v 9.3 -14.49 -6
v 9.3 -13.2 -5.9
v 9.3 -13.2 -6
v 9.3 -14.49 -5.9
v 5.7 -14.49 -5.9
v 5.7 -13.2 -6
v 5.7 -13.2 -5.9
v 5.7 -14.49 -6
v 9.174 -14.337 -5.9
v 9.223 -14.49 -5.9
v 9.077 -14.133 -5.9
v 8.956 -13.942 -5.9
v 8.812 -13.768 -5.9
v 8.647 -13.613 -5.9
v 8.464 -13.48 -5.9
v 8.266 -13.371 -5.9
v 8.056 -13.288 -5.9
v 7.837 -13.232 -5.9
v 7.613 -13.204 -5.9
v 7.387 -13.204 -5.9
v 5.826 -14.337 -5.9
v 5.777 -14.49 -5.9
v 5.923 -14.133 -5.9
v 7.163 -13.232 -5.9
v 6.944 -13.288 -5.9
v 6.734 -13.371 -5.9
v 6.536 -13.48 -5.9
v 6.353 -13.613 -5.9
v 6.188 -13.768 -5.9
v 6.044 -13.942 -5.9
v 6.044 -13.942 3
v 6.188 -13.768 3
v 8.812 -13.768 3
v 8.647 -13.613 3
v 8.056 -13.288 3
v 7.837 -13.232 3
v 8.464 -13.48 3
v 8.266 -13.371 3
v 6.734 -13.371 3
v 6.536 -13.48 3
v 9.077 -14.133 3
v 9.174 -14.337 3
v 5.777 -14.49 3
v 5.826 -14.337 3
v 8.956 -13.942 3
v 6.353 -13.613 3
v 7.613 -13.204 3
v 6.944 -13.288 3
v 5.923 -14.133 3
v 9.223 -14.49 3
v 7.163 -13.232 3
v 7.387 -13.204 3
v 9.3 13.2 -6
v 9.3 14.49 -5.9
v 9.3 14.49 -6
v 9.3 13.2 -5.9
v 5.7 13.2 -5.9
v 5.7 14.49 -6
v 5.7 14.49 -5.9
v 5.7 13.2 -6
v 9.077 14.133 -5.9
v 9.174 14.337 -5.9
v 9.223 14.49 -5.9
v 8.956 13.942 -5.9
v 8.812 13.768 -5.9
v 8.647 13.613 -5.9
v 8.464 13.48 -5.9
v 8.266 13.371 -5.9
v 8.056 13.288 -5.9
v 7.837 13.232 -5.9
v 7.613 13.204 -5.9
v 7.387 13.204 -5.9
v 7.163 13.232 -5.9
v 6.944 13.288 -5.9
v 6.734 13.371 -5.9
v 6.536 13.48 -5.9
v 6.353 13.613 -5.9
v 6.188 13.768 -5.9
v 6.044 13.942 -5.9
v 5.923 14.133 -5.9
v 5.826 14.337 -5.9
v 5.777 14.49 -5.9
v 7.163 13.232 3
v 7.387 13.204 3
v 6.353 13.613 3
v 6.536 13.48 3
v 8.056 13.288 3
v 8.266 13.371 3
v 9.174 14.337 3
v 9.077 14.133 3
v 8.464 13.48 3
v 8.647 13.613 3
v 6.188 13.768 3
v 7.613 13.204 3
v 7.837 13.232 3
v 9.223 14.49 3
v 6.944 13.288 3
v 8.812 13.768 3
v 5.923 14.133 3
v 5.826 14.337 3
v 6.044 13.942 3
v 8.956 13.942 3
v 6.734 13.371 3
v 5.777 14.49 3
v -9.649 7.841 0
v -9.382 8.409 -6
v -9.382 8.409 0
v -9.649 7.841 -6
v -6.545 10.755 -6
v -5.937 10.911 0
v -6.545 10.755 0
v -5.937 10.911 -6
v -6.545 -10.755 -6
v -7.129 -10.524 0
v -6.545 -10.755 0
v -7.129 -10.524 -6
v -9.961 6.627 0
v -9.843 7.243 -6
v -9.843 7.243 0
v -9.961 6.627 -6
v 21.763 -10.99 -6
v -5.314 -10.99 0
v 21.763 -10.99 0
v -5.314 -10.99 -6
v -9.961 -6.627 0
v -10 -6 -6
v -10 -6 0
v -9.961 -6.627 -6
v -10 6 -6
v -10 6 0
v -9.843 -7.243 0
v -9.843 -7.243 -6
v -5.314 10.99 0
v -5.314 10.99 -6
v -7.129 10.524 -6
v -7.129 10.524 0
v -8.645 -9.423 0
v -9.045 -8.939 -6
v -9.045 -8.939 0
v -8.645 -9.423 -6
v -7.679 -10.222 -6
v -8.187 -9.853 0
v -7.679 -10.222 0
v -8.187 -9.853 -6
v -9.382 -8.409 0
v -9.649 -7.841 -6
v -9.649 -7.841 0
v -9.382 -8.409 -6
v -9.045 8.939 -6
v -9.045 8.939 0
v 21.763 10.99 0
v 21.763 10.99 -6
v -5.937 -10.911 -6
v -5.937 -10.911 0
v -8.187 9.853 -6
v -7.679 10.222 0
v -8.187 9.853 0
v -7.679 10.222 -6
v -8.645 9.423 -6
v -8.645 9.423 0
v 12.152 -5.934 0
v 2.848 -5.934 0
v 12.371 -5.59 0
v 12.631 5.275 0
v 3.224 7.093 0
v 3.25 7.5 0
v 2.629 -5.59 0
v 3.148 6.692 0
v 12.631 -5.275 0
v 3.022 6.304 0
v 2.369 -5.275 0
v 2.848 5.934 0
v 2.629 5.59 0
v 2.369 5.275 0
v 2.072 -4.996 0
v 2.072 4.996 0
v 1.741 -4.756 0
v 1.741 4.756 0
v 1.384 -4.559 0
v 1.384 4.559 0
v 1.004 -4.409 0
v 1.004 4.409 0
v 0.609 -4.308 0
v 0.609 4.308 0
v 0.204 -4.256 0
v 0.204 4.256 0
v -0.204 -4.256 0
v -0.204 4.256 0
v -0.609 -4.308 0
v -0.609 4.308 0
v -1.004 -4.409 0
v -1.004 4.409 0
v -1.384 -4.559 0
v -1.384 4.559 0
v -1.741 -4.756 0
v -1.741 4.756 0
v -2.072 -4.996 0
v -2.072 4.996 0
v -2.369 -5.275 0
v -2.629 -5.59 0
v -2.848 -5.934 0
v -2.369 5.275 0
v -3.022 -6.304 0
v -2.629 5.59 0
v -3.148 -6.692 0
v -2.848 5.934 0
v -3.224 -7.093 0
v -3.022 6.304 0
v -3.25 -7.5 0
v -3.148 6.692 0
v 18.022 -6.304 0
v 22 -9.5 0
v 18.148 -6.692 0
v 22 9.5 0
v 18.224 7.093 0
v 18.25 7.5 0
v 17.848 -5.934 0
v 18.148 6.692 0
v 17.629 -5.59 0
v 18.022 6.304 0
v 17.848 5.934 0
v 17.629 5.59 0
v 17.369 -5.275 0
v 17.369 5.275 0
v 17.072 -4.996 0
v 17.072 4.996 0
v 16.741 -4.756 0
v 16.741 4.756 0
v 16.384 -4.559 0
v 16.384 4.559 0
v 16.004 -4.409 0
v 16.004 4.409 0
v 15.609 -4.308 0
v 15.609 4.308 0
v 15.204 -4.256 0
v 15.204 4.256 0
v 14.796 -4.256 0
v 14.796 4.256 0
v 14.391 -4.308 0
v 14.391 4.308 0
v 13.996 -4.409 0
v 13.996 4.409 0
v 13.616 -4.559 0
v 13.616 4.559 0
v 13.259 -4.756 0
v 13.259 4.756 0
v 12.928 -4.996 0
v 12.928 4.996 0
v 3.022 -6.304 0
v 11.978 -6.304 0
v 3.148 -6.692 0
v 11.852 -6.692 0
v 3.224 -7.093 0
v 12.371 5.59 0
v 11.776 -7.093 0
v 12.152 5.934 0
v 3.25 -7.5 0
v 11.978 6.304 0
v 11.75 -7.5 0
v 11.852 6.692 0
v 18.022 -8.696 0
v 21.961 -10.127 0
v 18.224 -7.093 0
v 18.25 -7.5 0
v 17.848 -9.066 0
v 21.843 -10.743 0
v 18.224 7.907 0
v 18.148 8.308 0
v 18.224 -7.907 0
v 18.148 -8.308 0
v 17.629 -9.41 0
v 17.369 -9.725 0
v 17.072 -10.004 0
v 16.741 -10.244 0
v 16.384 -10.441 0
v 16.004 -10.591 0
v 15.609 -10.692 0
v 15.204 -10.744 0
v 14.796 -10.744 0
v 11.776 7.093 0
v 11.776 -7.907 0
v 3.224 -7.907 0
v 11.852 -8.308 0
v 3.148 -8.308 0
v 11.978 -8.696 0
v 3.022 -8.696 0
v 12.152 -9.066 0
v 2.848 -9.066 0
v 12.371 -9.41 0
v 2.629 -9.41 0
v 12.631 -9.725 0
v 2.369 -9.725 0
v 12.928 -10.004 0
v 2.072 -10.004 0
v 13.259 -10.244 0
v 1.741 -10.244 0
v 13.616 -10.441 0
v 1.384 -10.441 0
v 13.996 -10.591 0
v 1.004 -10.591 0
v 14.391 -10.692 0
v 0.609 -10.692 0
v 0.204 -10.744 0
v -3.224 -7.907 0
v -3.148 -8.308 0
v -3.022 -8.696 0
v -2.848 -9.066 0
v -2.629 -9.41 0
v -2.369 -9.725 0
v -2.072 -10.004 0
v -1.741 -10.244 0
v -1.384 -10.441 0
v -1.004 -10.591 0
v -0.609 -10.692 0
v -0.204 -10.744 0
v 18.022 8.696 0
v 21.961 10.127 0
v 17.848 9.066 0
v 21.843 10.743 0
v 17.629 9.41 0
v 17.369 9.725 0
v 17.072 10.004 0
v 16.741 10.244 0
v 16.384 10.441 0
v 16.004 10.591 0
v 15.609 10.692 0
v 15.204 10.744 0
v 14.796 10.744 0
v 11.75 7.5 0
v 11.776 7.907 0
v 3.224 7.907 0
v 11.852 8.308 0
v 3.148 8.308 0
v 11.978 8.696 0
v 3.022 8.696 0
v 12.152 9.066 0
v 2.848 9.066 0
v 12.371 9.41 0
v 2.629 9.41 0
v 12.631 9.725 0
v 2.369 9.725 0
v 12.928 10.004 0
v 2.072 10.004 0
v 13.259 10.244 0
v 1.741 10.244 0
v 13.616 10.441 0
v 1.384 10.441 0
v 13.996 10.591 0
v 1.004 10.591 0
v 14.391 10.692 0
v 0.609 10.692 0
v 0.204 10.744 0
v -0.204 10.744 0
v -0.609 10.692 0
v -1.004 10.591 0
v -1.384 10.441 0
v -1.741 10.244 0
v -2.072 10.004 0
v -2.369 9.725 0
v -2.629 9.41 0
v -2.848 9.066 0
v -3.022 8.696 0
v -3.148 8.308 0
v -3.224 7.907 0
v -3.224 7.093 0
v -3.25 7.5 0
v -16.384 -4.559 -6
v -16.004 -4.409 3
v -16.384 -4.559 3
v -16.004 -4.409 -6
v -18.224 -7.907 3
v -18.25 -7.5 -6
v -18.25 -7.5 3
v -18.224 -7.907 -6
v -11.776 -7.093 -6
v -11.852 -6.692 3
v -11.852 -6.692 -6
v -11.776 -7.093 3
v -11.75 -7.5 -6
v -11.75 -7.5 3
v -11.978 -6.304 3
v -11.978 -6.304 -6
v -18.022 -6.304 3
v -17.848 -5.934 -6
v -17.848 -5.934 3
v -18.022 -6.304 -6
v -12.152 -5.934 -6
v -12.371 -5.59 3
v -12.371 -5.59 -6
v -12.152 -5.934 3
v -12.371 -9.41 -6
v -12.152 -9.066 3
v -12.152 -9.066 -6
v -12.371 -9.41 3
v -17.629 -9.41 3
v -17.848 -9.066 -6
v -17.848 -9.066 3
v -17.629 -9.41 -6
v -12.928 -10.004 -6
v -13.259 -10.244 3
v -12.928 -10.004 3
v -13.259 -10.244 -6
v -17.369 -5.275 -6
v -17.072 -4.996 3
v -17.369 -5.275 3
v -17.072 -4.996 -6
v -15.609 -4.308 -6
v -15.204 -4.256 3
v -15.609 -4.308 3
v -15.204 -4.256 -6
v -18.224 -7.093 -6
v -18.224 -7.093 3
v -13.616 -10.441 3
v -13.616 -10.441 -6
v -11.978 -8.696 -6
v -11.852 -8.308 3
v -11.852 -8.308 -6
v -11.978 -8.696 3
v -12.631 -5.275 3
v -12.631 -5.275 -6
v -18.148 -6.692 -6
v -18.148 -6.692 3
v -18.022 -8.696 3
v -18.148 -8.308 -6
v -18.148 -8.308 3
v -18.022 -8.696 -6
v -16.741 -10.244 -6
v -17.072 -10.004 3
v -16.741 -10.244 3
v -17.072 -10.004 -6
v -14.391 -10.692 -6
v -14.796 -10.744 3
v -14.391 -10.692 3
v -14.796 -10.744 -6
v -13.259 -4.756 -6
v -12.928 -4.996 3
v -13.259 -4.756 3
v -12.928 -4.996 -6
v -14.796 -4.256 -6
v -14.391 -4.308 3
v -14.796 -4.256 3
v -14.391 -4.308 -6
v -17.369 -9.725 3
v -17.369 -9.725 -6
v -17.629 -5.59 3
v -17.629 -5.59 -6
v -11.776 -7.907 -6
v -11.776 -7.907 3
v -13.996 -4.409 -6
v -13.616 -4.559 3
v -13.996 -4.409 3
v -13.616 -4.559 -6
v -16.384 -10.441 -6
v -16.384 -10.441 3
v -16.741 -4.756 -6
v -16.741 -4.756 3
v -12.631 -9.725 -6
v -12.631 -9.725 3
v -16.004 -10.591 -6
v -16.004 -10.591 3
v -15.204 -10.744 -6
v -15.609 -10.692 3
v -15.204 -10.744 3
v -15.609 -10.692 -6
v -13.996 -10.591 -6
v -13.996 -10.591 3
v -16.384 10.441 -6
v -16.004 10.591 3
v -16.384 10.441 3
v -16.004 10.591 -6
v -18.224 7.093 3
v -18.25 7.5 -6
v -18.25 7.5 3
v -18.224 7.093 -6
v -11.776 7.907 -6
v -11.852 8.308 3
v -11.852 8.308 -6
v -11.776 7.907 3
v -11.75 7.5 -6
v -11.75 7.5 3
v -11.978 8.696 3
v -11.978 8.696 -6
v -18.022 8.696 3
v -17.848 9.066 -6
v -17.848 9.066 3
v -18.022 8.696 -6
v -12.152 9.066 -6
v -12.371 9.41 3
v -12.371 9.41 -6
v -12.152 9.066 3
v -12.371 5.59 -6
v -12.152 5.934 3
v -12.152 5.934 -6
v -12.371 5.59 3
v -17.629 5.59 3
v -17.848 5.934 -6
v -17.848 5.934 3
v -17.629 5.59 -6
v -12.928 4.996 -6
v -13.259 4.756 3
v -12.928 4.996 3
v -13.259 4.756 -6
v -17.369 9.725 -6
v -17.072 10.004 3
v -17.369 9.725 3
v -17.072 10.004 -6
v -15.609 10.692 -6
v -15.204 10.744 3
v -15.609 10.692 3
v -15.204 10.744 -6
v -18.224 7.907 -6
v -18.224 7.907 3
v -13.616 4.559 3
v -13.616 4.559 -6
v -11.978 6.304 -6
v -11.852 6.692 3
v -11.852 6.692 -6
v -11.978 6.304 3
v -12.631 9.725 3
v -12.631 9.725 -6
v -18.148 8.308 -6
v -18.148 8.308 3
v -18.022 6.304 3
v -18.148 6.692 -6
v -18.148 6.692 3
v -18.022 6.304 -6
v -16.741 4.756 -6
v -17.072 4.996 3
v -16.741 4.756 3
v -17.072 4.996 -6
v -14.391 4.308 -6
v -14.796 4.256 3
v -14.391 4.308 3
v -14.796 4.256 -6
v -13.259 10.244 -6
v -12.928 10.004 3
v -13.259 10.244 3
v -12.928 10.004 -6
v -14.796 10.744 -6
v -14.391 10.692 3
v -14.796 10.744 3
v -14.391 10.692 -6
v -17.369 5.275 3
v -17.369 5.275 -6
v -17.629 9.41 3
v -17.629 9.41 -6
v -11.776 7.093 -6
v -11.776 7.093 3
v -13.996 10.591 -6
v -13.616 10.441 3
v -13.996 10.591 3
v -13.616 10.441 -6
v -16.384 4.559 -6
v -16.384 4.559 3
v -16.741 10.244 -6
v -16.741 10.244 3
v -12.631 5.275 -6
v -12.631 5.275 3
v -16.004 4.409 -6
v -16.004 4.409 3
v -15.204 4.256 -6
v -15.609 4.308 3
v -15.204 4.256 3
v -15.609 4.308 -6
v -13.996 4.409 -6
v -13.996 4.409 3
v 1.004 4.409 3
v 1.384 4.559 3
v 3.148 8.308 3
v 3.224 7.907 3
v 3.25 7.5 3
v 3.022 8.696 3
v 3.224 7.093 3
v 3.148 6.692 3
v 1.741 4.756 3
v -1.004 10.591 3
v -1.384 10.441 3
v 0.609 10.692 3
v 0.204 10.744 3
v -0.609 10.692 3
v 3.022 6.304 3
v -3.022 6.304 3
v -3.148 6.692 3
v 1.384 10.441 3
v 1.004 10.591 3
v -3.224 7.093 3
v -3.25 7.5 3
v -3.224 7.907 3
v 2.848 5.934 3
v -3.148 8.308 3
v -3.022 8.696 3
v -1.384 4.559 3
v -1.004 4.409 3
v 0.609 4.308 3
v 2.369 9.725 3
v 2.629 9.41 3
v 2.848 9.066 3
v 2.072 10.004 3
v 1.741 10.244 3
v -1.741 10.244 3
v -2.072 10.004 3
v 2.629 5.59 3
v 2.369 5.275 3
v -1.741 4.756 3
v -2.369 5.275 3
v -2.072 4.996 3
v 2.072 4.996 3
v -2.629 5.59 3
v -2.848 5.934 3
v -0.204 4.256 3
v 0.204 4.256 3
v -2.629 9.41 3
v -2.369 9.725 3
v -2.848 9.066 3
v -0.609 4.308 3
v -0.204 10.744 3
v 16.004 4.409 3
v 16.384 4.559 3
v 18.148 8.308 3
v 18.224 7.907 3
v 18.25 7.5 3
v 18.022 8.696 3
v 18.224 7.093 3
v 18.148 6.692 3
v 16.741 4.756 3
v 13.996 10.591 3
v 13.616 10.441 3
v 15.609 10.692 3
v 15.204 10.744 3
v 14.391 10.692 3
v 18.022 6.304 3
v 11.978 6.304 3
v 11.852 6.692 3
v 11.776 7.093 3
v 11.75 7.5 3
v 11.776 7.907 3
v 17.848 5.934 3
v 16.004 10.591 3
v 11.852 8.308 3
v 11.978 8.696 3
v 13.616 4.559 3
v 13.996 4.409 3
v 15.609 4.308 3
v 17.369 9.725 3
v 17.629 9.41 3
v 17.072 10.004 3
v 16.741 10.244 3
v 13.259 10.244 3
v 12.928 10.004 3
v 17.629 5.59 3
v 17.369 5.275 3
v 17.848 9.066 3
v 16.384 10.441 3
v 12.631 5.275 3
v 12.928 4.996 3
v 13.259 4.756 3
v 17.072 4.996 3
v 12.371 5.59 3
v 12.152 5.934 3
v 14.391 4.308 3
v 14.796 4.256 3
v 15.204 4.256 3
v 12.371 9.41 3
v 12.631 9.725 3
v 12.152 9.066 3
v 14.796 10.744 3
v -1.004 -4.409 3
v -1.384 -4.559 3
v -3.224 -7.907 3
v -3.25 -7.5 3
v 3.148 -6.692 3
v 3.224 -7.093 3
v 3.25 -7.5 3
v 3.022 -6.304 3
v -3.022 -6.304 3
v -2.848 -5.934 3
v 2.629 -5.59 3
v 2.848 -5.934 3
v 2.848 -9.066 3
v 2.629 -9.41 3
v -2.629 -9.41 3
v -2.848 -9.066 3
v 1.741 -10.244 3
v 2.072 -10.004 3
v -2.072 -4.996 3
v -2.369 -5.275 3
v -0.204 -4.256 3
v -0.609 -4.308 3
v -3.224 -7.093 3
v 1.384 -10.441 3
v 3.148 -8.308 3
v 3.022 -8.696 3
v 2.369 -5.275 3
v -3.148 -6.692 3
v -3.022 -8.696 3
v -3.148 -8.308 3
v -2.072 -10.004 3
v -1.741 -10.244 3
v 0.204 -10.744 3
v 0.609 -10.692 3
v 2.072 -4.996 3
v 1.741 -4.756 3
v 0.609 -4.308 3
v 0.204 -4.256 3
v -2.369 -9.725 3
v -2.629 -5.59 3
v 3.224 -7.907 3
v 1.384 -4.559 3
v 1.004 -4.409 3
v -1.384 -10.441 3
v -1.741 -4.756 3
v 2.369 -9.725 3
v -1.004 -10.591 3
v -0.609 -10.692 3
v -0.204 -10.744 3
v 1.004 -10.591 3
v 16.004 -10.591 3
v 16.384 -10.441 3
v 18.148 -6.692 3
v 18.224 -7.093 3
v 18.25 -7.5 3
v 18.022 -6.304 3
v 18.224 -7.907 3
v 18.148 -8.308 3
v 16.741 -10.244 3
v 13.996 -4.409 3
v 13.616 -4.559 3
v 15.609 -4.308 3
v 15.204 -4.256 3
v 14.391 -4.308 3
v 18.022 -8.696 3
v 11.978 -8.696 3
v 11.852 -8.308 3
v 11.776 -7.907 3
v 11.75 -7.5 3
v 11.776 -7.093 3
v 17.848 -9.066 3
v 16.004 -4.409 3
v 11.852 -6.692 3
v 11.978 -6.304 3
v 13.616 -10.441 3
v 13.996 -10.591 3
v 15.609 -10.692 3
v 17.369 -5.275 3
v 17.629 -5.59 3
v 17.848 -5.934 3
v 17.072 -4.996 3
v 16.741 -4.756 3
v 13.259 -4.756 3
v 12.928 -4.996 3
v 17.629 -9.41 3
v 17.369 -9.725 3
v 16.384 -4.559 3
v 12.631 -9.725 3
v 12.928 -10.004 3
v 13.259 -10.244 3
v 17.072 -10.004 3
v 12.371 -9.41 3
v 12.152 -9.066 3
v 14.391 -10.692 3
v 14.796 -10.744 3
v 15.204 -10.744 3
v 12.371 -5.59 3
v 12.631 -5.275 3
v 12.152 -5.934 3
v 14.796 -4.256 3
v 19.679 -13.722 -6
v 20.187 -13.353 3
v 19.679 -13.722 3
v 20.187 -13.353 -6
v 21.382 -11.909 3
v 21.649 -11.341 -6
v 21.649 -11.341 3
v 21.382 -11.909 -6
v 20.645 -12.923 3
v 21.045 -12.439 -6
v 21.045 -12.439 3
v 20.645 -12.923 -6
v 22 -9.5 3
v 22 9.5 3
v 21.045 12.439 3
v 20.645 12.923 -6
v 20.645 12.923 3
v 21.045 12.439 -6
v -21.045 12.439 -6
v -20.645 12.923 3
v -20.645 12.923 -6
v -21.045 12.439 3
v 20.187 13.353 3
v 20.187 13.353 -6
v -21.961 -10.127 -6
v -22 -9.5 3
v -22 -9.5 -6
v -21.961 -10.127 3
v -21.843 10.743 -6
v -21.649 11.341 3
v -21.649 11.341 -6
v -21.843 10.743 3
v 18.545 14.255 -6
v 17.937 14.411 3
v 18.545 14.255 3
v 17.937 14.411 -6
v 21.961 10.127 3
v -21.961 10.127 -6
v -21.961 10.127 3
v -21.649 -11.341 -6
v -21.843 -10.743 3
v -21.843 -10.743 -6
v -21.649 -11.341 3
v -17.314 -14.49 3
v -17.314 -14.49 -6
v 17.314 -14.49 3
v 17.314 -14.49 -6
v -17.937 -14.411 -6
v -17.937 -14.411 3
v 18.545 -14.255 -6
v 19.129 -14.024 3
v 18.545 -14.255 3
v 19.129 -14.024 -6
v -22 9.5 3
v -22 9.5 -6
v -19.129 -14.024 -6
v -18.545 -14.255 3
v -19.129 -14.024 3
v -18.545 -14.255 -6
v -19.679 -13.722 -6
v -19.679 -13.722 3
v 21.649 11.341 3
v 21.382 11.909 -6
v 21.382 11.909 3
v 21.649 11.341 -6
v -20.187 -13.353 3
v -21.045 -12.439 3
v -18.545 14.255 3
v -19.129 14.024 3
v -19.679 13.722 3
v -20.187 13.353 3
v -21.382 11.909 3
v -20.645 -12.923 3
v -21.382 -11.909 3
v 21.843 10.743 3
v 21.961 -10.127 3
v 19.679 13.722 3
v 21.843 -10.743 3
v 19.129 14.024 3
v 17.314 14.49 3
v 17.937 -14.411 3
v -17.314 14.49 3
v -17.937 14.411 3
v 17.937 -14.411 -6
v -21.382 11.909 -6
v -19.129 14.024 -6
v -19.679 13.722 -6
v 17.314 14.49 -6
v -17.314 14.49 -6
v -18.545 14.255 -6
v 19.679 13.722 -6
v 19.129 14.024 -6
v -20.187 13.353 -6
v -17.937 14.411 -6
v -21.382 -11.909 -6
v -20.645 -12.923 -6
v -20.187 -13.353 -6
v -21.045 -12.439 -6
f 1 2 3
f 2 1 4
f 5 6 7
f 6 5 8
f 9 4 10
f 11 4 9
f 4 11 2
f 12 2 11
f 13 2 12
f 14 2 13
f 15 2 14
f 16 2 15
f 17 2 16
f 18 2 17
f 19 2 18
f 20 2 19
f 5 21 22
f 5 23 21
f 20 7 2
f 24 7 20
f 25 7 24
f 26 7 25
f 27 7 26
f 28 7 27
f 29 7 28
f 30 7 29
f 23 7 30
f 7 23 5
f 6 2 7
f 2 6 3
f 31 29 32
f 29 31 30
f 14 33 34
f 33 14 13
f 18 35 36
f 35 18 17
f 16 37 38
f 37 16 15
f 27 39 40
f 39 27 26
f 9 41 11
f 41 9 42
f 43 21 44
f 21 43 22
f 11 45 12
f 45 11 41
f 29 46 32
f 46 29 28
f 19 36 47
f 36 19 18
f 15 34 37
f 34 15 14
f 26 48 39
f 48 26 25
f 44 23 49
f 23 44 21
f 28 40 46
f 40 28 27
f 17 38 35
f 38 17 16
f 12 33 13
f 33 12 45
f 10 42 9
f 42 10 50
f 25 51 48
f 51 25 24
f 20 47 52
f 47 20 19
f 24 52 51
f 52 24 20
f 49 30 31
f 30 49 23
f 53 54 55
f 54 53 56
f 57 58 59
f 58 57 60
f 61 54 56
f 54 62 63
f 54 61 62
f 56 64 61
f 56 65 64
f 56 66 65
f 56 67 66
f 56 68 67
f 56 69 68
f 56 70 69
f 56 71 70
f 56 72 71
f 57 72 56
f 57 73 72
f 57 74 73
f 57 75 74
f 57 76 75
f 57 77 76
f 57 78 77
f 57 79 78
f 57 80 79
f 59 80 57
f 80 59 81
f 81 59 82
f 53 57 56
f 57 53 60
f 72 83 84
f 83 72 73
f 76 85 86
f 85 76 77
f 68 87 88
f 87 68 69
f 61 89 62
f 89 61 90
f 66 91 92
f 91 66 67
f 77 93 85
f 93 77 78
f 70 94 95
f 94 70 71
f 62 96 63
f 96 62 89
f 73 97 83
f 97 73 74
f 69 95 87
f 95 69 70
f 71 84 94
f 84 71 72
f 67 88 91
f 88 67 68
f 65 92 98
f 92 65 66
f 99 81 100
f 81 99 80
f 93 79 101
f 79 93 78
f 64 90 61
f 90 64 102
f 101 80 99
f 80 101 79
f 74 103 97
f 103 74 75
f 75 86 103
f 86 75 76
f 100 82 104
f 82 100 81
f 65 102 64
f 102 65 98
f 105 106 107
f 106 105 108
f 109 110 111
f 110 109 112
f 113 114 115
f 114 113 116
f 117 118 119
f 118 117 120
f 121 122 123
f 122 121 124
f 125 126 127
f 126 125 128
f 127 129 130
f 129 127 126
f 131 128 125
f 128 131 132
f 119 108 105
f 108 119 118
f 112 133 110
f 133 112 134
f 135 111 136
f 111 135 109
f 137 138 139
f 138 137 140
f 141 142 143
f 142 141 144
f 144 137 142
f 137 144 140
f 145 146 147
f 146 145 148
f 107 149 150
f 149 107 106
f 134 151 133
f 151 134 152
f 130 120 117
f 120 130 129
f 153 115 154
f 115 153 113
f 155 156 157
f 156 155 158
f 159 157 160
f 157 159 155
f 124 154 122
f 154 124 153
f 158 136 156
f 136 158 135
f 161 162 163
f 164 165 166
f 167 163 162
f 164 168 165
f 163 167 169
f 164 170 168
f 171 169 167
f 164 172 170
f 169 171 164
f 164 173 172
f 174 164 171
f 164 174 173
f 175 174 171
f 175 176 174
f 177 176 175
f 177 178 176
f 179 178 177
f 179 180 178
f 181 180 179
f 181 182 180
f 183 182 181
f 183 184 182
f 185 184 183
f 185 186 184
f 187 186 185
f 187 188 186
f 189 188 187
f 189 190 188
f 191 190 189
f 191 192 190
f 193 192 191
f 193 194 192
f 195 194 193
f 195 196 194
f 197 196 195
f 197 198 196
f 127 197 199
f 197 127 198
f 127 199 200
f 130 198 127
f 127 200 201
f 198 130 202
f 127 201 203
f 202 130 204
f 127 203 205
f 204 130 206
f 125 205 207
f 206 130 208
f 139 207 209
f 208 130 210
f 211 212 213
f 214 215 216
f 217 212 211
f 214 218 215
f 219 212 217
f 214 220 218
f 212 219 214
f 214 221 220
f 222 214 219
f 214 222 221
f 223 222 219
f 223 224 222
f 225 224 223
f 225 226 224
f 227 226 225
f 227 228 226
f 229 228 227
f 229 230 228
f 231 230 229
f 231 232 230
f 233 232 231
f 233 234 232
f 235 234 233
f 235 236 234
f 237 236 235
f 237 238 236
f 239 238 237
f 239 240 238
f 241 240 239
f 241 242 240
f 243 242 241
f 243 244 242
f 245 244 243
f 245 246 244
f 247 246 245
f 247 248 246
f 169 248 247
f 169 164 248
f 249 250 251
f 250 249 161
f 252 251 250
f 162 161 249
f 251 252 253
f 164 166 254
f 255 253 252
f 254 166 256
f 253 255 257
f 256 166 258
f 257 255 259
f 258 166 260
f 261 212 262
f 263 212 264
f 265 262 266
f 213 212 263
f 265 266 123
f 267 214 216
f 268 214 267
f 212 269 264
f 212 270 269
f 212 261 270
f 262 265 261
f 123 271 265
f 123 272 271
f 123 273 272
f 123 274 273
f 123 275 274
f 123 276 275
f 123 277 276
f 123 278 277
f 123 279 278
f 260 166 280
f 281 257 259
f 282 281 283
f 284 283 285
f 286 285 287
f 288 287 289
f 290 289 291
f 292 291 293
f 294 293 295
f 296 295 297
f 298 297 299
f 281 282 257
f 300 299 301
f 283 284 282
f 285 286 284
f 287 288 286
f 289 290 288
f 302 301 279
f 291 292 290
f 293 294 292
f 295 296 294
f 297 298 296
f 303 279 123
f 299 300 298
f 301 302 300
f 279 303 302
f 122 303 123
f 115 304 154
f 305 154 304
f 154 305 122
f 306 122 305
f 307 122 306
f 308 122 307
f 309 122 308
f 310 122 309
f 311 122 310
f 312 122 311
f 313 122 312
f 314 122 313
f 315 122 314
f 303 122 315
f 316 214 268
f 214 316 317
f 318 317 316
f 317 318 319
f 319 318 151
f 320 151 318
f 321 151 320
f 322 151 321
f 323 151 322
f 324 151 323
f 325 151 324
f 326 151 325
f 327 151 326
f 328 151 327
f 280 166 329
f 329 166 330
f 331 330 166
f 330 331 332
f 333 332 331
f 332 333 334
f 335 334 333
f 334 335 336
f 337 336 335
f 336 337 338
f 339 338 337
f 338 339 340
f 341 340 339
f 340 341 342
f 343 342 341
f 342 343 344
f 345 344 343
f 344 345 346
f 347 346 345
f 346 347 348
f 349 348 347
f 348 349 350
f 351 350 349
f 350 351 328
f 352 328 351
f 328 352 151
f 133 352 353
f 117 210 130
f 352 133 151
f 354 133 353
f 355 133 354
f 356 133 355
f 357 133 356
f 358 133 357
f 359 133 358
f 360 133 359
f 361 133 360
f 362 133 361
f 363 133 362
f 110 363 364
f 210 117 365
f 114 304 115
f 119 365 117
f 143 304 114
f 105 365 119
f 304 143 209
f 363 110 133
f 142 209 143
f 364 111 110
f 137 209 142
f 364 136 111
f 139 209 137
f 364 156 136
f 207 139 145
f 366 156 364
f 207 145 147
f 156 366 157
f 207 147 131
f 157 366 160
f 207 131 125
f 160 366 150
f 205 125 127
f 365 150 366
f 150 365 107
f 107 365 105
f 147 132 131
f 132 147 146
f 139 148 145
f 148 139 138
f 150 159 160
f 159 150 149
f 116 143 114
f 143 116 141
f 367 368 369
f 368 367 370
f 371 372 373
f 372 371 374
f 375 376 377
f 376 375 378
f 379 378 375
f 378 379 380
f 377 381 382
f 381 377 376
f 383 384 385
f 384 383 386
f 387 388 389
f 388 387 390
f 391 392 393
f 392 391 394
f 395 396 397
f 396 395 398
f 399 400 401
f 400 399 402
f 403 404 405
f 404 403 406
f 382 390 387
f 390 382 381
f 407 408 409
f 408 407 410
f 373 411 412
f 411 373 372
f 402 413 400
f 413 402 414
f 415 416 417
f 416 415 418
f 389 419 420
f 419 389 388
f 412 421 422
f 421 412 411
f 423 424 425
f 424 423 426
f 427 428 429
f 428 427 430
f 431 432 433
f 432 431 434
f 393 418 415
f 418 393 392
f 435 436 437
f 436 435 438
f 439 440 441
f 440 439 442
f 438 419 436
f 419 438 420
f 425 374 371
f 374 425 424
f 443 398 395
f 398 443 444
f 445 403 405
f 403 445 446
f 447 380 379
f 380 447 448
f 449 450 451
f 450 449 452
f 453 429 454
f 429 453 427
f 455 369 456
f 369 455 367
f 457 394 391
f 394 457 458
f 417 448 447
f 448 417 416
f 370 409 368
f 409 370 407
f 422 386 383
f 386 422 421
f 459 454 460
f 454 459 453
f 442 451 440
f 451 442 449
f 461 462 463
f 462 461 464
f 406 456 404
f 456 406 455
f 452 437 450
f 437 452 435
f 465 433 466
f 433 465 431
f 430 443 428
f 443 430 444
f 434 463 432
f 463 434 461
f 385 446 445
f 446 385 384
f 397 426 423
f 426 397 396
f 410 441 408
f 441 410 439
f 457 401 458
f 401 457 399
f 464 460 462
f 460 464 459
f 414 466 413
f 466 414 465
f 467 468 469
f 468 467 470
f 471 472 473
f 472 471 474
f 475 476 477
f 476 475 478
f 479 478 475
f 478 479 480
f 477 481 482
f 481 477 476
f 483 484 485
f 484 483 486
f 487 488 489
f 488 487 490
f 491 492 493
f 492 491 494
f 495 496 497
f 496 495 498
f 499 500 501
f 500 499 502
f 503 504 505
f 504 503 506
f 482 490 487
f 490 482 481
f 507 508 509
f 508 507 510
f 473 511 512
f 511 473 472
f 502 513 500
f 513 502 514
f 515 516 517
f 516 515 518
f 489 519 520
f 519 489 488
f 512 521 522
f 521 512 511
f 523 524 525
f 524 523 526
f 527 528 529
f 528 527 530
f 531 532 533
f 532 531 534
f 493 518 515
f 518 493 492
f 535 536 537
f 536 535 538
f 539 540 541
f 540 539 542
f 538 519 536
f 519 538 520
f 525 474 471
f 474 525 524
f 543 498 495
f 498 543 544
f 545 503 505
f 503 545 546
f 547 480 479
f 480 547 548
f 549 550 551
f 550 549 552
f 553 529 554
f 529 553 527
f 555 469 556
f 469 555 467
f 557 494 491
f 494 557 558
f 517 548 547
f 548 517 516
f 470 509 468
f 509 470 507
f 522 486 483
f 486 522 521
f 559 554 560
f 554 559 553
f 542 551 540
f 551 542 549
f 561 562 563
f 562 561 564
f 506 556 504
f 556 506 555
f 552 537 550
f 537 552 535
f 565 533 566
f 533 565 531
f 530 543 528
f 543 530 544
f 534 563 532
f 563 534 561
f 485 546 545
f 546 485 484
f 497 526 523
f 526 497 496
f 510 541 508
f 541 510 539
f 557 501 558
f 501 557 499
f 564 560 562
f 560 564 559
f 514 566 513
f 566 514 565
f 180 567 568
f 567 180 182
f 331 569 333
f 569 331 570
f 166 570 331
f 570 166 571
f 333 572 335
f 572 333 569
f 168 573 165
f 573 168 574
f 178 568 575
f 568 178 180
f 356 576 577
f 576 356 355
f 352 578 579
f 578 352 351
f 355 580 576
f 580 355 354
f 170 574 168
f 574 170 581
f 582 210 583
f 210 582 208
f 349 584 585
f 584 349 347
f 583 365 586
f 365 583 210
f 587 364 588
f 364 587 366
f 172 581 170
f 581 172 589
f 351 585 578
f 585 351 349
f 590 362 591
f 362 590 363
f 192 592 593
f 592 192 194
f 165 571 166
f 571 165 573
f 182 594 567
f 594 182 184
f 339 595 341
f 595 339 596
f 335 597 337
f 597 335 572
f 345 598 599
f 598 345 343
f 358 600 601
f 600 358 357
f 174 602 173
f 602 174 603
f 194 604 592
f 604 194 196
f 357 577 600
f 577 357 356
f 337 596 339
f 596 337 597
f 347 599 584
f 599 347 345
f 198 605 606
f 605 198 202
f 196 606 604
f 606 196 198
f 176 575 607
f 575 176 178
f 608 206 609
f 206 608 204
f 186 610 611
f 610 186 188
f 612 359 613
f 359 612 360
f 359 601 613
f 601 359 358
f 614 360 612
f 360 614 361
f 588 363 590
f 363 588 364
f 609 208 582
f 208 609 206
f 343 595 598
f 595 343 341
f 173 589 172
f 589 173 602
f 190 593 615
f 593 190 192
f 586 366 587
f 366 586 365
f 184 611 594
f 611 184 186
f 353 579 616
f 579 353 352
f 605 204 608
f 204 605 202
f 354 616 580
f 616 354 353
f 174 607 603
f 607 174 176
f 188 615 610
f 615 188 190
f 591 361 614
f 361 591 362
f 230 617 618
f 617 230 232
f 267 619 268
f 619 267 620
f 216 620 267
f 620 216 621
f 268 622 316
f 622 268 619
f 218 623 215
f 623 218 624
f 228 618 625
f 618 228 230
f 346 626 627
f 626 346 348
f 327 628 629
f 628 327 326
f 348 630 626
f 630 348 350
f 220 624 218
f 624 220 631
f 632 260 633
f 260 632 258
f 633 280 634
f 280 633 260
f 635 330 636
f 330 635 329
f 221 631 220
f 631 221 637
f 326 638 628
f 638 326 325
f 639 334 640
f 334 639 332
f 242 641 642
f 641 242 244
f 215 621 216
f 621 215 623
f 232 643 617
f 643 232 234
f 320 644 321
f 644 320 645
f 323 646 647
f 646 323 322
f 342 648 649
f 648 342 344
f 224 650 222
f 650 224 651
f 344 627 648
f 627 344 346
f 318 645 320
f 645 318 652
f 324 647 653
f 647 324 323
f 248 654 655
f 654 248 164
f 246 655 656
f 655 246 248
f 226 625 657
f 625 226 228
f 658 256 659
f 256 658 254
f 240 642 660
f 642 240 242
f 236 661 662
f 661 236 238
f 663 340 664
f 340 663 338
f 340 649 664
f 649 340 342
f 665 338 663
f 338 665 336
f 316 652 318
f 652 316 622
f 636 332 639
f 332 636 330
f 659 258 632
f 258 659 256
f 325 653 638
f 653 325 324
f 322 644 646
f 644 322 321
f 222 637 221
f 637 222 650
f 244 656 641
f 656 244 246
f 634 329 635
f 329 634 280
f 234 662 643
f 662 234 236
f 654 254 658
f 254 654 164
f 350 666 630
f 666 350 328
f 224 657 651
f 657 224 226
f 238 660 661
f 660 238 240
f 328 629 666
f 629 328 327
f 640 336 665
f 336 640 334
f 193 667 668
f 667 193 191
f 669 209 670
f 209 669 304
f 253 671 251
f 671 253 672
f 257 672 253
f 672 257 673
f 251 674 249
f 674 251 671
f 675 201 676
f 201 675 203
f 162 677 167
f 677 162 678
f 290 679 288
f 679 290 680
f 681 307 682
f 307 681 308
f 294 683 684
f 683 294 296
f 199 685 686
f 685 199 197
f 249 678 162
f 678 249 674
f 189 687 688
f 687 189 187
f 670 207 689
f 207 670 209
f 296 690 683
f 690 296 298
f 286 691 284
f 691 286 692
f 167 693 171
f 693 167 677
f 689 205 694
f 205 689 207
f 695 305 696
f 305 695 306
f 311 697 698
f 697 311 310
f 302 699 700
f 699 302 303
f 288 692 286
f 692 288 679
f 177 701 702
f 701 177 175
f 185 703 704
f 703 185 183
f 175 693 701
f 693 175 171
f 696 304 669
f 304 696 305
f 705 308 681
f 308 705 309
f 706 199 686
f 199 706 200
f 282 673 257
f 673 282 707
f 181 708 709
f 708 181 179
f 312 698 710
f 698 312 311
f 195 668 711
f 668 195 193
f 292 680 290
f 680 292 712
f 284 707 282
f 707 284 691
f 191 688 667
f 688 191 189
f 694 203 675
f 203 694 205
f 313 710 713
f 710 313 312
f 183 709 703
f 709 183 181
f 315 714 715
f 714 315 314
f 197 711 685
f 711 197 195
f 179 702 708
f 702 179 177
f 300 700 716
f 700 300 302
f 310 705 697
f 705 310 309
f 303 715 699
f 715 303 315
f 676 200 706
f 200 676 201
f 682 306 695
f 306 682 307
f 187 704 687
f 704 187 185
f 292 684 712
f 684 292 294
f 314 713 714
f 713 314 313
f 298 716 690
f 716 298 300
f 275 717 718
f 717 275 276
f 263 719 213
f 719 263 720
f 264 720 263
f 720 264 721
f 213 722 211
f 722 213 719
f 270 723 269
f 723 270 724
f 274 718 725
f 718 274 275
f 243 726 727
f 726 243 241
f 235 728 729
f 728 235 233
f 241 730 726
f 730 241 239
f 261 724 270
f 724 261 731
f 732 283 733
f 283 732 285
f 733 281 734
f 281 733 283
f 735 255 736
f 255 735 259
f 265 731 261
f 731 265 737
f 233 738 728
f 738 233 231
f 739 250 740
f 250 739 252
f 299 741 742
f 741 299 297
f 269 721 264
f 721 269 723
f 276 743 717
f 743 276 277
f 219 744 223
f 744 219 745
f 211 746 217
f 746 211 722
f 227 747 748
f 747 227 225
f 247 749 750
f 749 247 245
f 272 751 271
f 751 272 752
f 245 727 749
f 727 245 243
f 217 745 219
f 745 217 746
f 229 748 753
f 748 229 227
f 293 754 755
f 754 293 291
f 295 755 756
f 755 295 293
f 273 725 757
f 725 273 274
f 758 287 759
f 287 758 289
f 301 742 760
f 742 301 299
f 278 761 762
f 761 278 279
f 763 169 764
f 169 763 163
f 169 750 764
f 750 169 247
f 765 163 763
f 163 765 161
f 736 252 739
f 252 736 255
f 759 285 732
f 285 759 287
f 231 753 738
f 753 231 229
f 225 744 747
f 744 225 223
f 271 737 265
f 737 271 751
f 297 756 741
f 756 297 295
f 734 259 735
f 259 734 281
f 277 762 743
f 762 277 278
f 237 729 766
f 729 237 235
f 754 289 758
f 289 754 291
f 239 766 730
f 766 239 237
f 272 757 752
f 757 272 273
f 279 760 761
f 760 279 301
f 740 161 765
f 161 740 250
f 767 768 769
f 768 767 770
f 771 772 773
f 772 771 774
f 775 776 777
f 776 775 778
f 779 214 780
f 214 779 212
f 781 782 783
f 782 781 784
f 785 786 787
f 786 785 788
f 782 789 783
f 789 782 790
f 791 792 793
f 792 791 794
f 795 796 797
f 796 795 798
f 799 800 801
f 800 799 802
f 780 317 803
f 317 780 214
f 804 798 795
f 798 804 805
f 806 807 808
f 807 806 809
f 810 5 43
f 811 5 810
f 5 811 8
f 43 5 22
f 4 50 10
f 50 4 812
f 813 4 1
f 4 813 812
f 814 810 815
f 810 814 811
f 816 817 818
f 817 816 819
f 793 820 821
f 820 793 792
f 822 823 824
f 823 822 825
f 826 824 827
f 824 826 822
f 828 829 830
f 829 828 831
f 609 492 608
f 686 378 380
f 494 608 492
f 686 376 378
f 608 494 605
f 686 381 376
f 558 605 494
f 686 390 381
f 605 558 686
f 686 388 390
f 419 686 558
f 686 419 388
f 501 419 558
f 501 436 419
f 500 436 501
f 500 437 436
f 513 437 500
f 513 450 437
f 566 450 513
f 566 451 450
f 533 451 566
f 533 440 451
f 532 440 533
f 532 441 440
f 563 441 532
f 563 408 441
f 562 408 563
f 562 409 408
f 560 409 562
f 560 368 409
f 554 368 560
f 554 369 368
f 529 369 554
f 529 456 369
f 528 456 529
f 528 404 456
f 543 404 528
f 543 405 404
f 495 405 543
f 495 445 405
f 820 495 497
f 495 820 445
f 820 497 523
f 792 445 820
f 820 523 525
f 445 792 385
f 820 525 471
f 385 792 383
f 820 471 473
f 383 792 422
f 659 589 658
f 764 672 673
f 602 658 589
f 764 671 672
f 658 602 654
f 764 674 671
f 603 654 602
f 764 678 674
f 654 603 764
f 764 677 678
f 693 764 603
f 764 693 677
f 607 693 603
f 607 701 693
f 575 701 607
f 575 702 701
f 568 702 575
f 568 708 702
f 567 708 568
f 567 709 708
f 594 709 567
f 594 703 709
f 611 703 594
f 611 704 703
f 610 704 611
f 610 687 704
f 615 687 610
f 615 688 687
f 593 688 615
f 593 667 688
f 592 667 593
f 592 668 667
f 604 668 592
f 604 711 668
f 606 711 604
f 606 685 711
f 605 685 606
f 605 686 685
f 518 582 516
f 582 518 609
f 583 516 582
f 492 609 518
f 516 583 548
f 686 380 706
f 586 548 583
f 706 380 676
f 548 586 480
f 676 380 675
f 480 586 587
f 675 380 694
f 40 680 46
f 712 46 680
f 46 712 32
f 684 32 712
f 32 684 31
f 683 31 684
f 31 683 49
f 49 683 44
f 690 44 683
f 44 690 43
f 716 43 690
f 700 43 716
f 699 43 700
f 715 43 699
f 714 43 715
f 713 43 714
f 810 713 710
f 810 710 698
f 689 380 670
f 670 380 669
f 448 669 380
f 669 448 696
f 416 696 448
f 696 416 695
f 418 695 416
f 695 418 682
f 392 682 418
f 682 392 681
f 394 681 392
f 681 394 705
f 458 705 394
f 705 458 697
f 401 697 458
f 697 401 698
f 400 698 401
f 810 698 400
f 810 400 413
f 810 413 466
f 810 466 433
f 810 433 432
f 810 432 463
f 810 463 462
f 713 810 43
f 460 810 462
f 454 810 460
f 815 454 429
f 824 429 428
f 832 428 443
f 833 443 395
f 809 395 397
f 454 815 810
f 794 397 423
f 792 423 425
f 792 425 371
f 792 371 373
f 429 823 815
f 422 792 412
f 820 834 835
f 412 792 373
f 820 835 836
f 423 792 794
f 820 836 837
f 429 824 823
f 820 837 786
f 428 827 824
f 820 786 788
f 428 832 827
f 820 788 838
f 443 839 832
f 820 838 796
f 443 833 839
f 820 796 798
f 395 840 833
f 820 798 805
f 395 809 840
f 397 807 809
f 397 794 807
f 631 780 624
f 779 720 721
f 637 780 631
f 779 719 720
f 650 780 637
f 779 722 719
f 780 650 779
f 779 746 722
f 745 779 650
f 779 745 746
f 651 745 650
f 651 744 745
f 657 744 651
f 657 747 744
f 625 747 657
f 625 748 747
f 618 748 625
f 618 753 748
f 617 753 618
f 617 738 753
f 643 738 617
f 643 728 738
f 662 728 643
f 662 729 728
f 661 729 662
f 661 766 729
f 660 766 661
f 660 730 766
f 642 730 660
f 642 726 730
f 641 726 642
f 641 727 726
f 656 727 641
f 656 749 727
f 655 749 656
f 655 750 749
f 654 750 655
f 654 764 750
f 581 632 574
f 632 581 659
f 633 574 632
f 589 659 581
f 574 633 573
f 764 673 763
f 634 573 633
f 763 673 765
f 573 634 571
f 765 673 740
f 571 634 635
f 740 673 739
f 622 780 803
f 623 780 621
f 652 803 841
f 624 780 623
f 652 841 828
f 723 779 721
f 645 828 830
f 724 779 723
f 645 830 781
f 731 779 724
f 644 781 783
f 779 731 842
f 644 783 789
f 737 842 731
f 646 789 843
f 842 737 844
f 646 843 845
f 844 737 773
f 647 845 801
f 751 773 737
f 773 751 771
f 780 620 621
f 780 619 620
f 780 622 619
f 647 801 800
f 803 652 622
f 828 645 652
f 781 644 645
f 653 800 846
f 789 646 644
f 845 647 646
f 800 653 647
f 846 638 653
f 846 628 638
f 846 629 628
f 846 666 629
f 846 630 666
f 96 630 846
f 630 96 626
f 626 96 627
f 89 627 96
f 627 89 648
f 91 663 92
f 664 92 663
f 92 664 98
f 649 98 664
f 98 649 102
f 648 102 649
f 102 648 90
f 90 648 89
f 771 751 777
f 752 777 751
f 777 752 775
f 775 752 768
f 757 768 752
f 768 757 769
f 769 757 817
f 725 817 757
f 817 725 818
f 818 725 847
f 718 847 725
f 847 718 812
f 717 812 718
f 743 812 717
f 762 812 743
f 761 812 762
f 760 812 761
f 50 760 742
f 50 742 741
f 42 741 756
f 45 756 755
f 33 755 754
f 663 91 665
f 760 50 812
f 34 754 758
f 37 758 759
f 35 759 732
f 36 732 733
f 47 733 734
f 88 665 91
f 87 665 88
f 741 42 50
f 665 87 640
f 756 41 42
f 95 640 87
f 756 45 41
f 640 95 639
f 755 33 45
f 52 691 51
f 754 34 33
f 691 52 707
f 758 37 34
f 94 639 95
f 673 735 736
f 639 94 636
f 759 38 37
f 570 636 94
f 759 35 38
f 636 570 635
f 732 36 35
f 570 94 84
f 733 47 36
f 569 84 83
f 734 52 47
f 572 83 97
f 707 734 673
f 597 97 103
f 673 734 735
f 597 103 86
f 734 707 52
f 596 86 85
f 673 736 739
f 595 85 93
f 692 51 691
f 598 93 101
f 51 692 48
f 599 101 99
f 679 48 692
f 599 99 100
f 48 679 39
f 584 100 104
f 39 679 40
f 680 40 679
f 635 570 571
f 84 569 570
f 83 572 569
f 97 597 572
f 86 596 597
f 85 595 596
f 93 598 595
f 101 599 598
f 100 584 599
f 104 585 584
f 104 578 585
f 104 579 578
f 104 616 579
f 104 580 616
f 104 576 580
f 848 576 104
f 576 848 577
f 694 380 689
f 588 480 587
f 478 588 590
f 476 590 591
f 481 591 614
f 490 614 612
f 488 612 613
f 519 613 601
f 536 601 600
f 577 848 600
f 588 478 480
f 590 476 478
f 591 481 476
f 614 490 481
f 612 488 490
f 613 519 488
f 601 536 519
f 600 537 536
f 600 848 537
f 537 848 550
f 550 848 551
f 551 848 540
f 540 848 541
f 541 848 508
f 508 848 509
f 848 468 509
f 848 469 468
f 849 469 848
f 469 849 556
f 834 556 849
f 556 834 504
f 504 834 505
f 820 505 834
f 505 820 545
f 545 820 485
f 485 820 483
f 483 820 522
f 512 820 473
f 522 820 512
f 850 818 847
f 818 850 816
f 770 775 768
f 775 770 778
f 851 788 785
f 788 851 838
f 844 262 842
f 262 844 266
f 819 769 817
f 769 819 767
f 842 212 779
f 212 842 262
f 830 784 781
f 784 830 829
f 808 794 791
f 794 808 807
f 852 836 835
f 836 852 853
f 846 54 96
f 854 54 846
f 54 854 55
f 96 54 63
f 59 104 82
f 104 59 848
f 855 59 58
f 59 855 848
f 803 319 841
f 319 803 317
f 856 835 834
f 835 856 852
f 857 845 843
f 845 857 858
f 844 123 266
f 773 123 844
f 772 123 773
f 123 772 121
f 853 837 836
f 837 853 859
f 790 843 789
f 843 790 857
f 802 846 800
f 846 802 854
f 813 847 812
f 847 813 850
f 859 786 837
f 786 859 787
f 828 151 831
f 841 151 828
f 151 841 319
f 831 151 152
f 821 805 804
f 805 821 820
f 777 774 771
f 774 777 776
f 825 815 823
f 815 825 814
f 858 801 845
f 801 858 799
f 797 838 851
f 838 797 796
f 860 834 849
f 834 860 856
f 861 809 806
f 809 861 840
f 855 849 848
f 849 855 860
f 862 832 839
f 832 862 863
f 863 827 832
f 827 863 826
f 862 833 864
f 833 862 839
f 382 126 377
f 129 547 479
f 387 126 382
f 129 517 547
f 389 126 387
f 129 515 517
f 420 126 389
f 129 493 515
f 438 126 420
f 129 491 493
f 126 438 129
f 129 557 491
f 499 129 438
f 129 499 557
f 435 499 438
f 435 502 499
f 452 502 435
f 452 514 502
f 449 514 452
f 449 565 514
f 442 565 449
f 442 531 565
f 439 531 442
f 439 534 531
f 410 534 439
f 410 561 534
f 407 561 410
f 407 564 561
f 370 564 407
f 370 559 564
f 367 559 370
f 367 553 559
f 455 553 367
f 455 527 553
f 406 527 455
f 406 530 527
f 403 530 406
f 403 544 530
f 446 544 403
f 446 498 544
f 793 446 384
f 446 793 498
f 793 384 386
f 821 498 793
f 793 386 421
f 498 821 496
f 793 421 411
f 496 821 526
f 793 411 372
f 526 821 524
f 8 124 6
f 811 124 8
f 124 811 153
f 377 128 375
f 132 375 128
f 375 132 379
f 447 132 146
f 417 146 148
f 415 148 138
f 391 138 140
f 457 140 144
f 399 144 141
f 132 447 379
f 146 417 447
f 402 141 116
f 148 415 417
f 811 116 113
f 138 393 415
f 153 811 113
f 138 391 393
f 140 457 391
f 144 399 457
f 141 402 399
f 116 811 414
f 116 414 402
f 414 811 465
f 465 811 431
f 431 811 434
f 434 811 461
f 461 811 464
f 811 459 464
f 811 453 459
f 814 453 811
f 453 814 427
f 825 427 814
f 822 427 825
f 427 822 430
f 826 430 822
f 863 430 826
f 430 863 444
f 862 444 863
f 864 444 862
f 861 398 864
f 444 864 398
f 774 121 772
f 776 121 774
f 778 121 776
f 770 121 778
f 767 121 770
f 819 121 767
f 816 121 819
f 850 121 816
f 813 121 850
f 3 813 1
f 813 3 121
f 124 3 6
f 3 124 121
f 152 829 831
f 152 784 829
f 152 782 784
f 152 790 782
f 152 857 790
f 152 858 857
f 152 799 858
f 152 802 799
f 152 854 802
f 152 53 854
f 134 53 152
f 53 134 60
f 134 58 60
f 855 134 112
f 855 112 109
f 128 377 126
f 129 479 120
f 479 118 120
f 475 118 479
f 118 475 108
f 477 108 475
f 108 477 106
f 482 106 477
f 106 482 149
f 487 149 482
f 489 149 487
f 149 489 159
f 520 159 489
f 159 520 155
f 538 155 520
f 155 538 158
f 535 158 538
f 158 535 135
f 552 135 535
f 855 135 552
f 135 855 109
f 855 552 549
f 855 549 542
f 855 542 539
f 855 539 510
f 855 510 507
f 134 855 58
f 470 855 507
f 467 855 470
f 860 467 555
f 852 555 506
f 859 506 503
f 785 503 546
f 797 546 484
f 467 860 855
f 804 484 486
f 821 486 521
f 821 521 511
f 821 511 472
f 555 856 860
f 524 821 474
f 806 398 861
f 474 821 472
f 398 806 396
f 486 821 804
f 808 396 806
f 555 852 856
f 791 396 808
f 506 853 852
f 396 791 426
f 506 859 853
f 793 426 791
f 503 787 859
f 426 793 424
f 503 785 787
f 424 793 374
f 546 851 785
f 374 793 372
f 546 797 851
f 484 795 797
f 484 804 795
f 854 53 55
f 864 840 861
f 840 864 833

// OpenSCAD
$fn = 50;


difference() {
	union() {
		*color(alpha = 1.0000000000, c = "gray") {
			translate(v = [0, 14, -6]) {
				linear_extrude(height = 2) {
					text(font = "Arial:style=Bold", halign = "center", size = 4.5000000000, text = "COMMENT description oobb_plate_shape_positive_type_9_depth_0_0_-6_pos_spacer_u_extra_9_thickness_3_width_2_height_0_0_-9_pos_plate", valign = "center");
				}
			}
		}
		translate(v = [0, 0, -6]) {
			hull() {
				translate(v = [-17.0000000000, 9.5000000000, 0]) {
					cylinder(h = 9, r = 5);
				}
				translate(v = [17.0000000000, 9.5000000000, 0]) {
					cylinder(h = 9, r = 5);
				}
				translate(v = [-17.0000000000, -9.5000000000, 0]) {
					cylinder(h = 9, r = 5);
				}
				translate(v = [17.0000000000, -9.5000000000, 0]) {
					cylinder(h = 9, r = 5);
				}
			}
		}
		*color(alpha = 1.0000000000, c = "gray") {
			translate(v = [0, 14, -9]) {
				linear_extrude(height = 2) {
					text(font = "Arial:style=Bold", halign = "center", size = 4.5000000000, text = "COMMENT description oobb_holes_shape_p_type_0_0_-9_pos_spacer_u_extra_9_thickness_3_width_2_height_0_0_-9_pos_plate_'left'_'right'_'top'_hole_sides_'left'_'right'_'top'_holes_true_both_holes", valign = "center");
				}
			}
		}
		*color(alpha = 1.0000000000, c = "gray") {
			translate(v = [0, 14, -3]) {
				rotate(a = [0, 0, 180]) {
					linear_extrude(height = 2) {
						text(font = "Arial:style=Bold", halign = "center", size = 4.5000000000, text = "COMMENT description oobb_wire_spacer_u_shape_0_0_-3_pos_spacer_u_extra_9_thickness_3_width_2_height_0_0_-9_pos_plate_0_0_180_rot", valign = "center");
					}
				}
			}
		}
	}
	union() {
		translate(v = [7.5000000000, -15, -9]) {
			rotate(a = [0, 0, 0]) {
				difference() {
					union() {
						#translate(v = [-1.8000000000, -3.0000000000, -0.3000000000]) {
							cube(size = [3.6000000000, 6.0000000000, 0.3000000000]);
						}
						#translate(v = [-1.8000000000, -1.8000000000, -0.6000000000]) {
							cube(size = [3.6000000000, 3.6000000000, 0.3000000000]);
						}
						#translate(v = [-1.8000000000, -3.0000000000, 2.5000000000]) {
							cube(size = [3.6000000000, 6.0000000000, 0.3000000000]);
						}
						#translate(v = [-1.8000000000, -1.8000000000, 2.8000000000]) {
							cube(size = [3.6000000000, 3.6000000000, 0.3000000000]);
						}
						#translate(v = [0, 0, -50.0000000000]) {
							cylinder(h = 100, r = 1.8000000000);
						}
						#linear_extrude(height = 2.5000000000) {
							polygon(points = [[3.4620000000, 0.0000000000], [1.7310000000, 2.9981799479], [-1.7310000000, 2.9981799479], [-3.4620000000, 0.0000000000], [-1.7310000000, -2.9981799479], [1.7310000000, -2.9981799479]]);
						}
						#translate(v = [-1.8000000000, -3.0000000000, -0.3000000000]) {
							cube(size = [3.6000000000, 6.0000000000, 0.3000000000]);
						}
						#translate(v = [-1.8000000000, -1.8000000000, -0.6000000000]) {
							cube(size = [3.6000000000, 3.6000000000, 0.3000000000]);
						}
						#translate(v = [-1.8000000000, -3.0000000000, 2.5000000000]) {
							cube(size = [3.6000000000, 6.0000000000, 0.3000000000]);
						}
						#translate(v = [-1.8000000000, -1.8000000000, 2.8000000000]) {
							cube(size = [3.6000000000, 3.6000000000, 0.3000000000]);
						}
						#translate(v = [0, 0, -50.0000000000]) {
							cylinder(h = 100, r = 1.8000000000);
						}
						#translate(v = [-1.8000000000, -3.0000000000, -0.3000000000]) {
							cube(size = [3.6000000000, 6.0000000000, 0.3000000000]);
						}
						#translate(v = [-1.8000000000, -1.8000000000, -0.6000000000]) {
							cube(size = [3.6000000000, 3.6000000000, 0.3000000000]);
						}
						#translate(v = [-1.8000000000, -3.0000000000, 2.5000000000]) {
							cube(size = [3.6000000000, 6.0000000000, 0.3000000000]);
						}
						#translate(v = [-1.8000000000, -1.8000000000, 2.8000000000]) {
							cube(size = [3.6000000000, 3.6000000000, 0.3000000000]);
						}
						#translate(v = [0, 0, -50.0000000000]) {
							cylinder(h = 100, r = 1.8000000000);
						}
					}
					union();
				}
			}
		}
		translate(v = [7.5000000000, 15, -9]) {
			rotate(a = [0, 0, 0]) {
				difference() {
					union() {
						#translate(v = [-1.8000000000, -3.0000000000, -0.3000000000]) {
							cube(size = [3.6000000000, 6.0000000000, 0.3000000000]);
						}
						#translate(v = [-1.8000000000, -1.8000000000, -0.6000000000]) {
							cube(size = [3.6000000000, 3.6000000000, 0.3000000000]);
						}
						#translate(v = [-1.8000000000, -3.0000000000, 2.5000000000]) {
							cube(size = [3.6000000000, 6.0000000000, 0.3000000000]);
						}
						#translate(v = [-1.8000000000, -1.8000000000, 2.8000000000]) {
							cube(size = [3.6000000000, 3.6000000000, 0.3000000000]);
						}
						#translate(v = [0, 0, -50.0000000000]) {
							cylinder(h = 100, r = 1.8000000000);
						}
						#linear_extrude(height = 2.5000000000) {
							polygon(points = [[3.4620000000, 0.0000000000], [1.7310000000, 2.9981799479], [-1.7310000000, 2.9981799479], [-3.4620000000, 0.0000000000], [-1.7310000000, -2.9981799479], [1.7310000000, -2.9981799479]]);
						}
						#translate(v = [-1.8000000000, -3.0000000000, -0.3000000000]) {
							cube(size = [3.6000000000, 6.0000000000, 0.3000000000]);
						}
						#translate(v = [-1.8000000000, -1.8000000000, -0.6000000000]) {
							cube(size = [3.6000000000, 3.6000000000, 0.3000000000]);
						}
						#translate(v = [-1.8000000000, -3.0000000000, 2.5000000000]) {
							cube(size = [3.6000000000, 6.0000000000, 0.3000000000]);
						}
						#translate(v = [-1.8000000000, -1.8000000000, 2.8000000000]) {
							cube(size = [3.6000000000, 3.6000000000, 0.3000000000]);
						}
						#translate(v = [0, 0, -50.0000000000]) {
							cylinder(h = 100, r = 1.8000000000);
						}
						#translate(v = [-1.8000000000, -3.0000000000, -0.3000000000]) {
							cube(size = [3.6000000000, 6.0000000000, 0.3000000000]);
						}
						#translate(v = [-1.8000000000, -1.8000000000, -0.6000000000]) {
							cube(size = [3.6000000000, 3.6000000000, 0.3000000000]);
						}
						#translate(v = [-1.8000000000, -3.0000000000, 2.5000000000]) {
							cube(size = [3.6000000000, 6.0000000000, 0.3000000000]);
						}
						#translate(v = [-1.8000000000, -1.8000000000, 2.8000000000]) {
							cube(size = [3.6000000000, 3.6000000000, 0.3000000000]);
						}
						#translate(v = [0, 0, -50.0000000000]) {
							cylinder(h = 100, r = 1.8000000000);
						}
					}
					union();
				}
			}
		}
		translate(v = [0, 0, -3]) {
			rotate(a = [0, 0, 180]) {
				difference() {
					union() {
						translate(v = [-10, 0, -6]) {
							hull() {
								translate(v = [-15.0000000000, 6.0000000000, 0]) {
									cylinder(h = 9, r = 5);
								}
								translate(v = [15.0000000000, 6.0000000000, 0]) {
									cylinder(h = 9, r = 5);
								}
								translate(v = [-15.0000000000, -6.0000000000, 0]) {
									cylinder(h = 9, r = 5);
								}
								translate(v = [15.0000000000, -6.0000000000, 0]) {
									cylinder(h = 9, r = 5);
								}
							}
						}
					}
					union();
				}
			}
		}
		translate(v = [-15.0000000000, -7.5000000000, -50.0000000000]) {
			cylinder(h = 100, r = 3.2500000000);
		}
		translate(v = [-15.0000000000, 7.5000000000, -50.0000000000]) {
			cylinder(h = 100, r = 3.2500000000);
		}
		translate(v = [-15.0000000000, 7.5000000000, -50.0000000000]) {
			cylinder(h = 100, r = 3.2500000000);
		}
		translate(v = [0.0000000000, 7.5000000000, -50.0000000000]) {
			cylinder(h = 100, r = 3.2500000000);
		}
		translate(v = [15.0000000000, 7.5000000000, -50.0000000000]) {
			cylinder(h = 100, r = 3.2500000000);
		}
		translate(v = [-15.0000000000, -7.5000000000, -50.0000000000]) {
			cylinder(h = 100, r = 3.2500000000);
		}
		translate(v = [0.0000000000, -7.5000000000, -50.0000000000]) {
			cylinder(h = 100, r = 3.2500000000);
		}
		translate(v = [15.0000000000, -7.5000000000, -50.0000000000]) {
			cylinder(h = 100, r = 3.2500000000);
		}
		*color(alpha = 1.0000000000, c = "gray") {
			translate(v = [7.5000000000, -1, -9]) {
				linear_extrude(height = 2) {
					text(font = "Arial:style=Bold", halign = "center", size = 4.5000000000, text = "COMMENT description oobb_nut_shape_negative_type_m3_radius_name_7.5_-15_-9_pos_9_thickness_3_width_2_height_0_0_-9_pos_plate_bottom_zz_true_overhang_0_0_0_rot_false_nut_true_hole", valign = "center");
				}
			}
		}
		*color(alpha = 1.0000000000, c = "gray") {
			translate(v = [7.5000000000, 29, -9]) {
				linear_extrude(height = 2) {
					text(font = "Arial:style=Bold", halign = "center", size = 4.5000000000, text = "COMMENT description oobb_nut_shape_negative_type_m3_radius_name_7.5_15_-9_pos_9_thickness_3_width_2_height_0_0_-9_pos_plate_bottom_zz_true_overhang_0_0_0_rot_false_nut_true_hole", valign = "center");
				}
			}
		}
	}
}
